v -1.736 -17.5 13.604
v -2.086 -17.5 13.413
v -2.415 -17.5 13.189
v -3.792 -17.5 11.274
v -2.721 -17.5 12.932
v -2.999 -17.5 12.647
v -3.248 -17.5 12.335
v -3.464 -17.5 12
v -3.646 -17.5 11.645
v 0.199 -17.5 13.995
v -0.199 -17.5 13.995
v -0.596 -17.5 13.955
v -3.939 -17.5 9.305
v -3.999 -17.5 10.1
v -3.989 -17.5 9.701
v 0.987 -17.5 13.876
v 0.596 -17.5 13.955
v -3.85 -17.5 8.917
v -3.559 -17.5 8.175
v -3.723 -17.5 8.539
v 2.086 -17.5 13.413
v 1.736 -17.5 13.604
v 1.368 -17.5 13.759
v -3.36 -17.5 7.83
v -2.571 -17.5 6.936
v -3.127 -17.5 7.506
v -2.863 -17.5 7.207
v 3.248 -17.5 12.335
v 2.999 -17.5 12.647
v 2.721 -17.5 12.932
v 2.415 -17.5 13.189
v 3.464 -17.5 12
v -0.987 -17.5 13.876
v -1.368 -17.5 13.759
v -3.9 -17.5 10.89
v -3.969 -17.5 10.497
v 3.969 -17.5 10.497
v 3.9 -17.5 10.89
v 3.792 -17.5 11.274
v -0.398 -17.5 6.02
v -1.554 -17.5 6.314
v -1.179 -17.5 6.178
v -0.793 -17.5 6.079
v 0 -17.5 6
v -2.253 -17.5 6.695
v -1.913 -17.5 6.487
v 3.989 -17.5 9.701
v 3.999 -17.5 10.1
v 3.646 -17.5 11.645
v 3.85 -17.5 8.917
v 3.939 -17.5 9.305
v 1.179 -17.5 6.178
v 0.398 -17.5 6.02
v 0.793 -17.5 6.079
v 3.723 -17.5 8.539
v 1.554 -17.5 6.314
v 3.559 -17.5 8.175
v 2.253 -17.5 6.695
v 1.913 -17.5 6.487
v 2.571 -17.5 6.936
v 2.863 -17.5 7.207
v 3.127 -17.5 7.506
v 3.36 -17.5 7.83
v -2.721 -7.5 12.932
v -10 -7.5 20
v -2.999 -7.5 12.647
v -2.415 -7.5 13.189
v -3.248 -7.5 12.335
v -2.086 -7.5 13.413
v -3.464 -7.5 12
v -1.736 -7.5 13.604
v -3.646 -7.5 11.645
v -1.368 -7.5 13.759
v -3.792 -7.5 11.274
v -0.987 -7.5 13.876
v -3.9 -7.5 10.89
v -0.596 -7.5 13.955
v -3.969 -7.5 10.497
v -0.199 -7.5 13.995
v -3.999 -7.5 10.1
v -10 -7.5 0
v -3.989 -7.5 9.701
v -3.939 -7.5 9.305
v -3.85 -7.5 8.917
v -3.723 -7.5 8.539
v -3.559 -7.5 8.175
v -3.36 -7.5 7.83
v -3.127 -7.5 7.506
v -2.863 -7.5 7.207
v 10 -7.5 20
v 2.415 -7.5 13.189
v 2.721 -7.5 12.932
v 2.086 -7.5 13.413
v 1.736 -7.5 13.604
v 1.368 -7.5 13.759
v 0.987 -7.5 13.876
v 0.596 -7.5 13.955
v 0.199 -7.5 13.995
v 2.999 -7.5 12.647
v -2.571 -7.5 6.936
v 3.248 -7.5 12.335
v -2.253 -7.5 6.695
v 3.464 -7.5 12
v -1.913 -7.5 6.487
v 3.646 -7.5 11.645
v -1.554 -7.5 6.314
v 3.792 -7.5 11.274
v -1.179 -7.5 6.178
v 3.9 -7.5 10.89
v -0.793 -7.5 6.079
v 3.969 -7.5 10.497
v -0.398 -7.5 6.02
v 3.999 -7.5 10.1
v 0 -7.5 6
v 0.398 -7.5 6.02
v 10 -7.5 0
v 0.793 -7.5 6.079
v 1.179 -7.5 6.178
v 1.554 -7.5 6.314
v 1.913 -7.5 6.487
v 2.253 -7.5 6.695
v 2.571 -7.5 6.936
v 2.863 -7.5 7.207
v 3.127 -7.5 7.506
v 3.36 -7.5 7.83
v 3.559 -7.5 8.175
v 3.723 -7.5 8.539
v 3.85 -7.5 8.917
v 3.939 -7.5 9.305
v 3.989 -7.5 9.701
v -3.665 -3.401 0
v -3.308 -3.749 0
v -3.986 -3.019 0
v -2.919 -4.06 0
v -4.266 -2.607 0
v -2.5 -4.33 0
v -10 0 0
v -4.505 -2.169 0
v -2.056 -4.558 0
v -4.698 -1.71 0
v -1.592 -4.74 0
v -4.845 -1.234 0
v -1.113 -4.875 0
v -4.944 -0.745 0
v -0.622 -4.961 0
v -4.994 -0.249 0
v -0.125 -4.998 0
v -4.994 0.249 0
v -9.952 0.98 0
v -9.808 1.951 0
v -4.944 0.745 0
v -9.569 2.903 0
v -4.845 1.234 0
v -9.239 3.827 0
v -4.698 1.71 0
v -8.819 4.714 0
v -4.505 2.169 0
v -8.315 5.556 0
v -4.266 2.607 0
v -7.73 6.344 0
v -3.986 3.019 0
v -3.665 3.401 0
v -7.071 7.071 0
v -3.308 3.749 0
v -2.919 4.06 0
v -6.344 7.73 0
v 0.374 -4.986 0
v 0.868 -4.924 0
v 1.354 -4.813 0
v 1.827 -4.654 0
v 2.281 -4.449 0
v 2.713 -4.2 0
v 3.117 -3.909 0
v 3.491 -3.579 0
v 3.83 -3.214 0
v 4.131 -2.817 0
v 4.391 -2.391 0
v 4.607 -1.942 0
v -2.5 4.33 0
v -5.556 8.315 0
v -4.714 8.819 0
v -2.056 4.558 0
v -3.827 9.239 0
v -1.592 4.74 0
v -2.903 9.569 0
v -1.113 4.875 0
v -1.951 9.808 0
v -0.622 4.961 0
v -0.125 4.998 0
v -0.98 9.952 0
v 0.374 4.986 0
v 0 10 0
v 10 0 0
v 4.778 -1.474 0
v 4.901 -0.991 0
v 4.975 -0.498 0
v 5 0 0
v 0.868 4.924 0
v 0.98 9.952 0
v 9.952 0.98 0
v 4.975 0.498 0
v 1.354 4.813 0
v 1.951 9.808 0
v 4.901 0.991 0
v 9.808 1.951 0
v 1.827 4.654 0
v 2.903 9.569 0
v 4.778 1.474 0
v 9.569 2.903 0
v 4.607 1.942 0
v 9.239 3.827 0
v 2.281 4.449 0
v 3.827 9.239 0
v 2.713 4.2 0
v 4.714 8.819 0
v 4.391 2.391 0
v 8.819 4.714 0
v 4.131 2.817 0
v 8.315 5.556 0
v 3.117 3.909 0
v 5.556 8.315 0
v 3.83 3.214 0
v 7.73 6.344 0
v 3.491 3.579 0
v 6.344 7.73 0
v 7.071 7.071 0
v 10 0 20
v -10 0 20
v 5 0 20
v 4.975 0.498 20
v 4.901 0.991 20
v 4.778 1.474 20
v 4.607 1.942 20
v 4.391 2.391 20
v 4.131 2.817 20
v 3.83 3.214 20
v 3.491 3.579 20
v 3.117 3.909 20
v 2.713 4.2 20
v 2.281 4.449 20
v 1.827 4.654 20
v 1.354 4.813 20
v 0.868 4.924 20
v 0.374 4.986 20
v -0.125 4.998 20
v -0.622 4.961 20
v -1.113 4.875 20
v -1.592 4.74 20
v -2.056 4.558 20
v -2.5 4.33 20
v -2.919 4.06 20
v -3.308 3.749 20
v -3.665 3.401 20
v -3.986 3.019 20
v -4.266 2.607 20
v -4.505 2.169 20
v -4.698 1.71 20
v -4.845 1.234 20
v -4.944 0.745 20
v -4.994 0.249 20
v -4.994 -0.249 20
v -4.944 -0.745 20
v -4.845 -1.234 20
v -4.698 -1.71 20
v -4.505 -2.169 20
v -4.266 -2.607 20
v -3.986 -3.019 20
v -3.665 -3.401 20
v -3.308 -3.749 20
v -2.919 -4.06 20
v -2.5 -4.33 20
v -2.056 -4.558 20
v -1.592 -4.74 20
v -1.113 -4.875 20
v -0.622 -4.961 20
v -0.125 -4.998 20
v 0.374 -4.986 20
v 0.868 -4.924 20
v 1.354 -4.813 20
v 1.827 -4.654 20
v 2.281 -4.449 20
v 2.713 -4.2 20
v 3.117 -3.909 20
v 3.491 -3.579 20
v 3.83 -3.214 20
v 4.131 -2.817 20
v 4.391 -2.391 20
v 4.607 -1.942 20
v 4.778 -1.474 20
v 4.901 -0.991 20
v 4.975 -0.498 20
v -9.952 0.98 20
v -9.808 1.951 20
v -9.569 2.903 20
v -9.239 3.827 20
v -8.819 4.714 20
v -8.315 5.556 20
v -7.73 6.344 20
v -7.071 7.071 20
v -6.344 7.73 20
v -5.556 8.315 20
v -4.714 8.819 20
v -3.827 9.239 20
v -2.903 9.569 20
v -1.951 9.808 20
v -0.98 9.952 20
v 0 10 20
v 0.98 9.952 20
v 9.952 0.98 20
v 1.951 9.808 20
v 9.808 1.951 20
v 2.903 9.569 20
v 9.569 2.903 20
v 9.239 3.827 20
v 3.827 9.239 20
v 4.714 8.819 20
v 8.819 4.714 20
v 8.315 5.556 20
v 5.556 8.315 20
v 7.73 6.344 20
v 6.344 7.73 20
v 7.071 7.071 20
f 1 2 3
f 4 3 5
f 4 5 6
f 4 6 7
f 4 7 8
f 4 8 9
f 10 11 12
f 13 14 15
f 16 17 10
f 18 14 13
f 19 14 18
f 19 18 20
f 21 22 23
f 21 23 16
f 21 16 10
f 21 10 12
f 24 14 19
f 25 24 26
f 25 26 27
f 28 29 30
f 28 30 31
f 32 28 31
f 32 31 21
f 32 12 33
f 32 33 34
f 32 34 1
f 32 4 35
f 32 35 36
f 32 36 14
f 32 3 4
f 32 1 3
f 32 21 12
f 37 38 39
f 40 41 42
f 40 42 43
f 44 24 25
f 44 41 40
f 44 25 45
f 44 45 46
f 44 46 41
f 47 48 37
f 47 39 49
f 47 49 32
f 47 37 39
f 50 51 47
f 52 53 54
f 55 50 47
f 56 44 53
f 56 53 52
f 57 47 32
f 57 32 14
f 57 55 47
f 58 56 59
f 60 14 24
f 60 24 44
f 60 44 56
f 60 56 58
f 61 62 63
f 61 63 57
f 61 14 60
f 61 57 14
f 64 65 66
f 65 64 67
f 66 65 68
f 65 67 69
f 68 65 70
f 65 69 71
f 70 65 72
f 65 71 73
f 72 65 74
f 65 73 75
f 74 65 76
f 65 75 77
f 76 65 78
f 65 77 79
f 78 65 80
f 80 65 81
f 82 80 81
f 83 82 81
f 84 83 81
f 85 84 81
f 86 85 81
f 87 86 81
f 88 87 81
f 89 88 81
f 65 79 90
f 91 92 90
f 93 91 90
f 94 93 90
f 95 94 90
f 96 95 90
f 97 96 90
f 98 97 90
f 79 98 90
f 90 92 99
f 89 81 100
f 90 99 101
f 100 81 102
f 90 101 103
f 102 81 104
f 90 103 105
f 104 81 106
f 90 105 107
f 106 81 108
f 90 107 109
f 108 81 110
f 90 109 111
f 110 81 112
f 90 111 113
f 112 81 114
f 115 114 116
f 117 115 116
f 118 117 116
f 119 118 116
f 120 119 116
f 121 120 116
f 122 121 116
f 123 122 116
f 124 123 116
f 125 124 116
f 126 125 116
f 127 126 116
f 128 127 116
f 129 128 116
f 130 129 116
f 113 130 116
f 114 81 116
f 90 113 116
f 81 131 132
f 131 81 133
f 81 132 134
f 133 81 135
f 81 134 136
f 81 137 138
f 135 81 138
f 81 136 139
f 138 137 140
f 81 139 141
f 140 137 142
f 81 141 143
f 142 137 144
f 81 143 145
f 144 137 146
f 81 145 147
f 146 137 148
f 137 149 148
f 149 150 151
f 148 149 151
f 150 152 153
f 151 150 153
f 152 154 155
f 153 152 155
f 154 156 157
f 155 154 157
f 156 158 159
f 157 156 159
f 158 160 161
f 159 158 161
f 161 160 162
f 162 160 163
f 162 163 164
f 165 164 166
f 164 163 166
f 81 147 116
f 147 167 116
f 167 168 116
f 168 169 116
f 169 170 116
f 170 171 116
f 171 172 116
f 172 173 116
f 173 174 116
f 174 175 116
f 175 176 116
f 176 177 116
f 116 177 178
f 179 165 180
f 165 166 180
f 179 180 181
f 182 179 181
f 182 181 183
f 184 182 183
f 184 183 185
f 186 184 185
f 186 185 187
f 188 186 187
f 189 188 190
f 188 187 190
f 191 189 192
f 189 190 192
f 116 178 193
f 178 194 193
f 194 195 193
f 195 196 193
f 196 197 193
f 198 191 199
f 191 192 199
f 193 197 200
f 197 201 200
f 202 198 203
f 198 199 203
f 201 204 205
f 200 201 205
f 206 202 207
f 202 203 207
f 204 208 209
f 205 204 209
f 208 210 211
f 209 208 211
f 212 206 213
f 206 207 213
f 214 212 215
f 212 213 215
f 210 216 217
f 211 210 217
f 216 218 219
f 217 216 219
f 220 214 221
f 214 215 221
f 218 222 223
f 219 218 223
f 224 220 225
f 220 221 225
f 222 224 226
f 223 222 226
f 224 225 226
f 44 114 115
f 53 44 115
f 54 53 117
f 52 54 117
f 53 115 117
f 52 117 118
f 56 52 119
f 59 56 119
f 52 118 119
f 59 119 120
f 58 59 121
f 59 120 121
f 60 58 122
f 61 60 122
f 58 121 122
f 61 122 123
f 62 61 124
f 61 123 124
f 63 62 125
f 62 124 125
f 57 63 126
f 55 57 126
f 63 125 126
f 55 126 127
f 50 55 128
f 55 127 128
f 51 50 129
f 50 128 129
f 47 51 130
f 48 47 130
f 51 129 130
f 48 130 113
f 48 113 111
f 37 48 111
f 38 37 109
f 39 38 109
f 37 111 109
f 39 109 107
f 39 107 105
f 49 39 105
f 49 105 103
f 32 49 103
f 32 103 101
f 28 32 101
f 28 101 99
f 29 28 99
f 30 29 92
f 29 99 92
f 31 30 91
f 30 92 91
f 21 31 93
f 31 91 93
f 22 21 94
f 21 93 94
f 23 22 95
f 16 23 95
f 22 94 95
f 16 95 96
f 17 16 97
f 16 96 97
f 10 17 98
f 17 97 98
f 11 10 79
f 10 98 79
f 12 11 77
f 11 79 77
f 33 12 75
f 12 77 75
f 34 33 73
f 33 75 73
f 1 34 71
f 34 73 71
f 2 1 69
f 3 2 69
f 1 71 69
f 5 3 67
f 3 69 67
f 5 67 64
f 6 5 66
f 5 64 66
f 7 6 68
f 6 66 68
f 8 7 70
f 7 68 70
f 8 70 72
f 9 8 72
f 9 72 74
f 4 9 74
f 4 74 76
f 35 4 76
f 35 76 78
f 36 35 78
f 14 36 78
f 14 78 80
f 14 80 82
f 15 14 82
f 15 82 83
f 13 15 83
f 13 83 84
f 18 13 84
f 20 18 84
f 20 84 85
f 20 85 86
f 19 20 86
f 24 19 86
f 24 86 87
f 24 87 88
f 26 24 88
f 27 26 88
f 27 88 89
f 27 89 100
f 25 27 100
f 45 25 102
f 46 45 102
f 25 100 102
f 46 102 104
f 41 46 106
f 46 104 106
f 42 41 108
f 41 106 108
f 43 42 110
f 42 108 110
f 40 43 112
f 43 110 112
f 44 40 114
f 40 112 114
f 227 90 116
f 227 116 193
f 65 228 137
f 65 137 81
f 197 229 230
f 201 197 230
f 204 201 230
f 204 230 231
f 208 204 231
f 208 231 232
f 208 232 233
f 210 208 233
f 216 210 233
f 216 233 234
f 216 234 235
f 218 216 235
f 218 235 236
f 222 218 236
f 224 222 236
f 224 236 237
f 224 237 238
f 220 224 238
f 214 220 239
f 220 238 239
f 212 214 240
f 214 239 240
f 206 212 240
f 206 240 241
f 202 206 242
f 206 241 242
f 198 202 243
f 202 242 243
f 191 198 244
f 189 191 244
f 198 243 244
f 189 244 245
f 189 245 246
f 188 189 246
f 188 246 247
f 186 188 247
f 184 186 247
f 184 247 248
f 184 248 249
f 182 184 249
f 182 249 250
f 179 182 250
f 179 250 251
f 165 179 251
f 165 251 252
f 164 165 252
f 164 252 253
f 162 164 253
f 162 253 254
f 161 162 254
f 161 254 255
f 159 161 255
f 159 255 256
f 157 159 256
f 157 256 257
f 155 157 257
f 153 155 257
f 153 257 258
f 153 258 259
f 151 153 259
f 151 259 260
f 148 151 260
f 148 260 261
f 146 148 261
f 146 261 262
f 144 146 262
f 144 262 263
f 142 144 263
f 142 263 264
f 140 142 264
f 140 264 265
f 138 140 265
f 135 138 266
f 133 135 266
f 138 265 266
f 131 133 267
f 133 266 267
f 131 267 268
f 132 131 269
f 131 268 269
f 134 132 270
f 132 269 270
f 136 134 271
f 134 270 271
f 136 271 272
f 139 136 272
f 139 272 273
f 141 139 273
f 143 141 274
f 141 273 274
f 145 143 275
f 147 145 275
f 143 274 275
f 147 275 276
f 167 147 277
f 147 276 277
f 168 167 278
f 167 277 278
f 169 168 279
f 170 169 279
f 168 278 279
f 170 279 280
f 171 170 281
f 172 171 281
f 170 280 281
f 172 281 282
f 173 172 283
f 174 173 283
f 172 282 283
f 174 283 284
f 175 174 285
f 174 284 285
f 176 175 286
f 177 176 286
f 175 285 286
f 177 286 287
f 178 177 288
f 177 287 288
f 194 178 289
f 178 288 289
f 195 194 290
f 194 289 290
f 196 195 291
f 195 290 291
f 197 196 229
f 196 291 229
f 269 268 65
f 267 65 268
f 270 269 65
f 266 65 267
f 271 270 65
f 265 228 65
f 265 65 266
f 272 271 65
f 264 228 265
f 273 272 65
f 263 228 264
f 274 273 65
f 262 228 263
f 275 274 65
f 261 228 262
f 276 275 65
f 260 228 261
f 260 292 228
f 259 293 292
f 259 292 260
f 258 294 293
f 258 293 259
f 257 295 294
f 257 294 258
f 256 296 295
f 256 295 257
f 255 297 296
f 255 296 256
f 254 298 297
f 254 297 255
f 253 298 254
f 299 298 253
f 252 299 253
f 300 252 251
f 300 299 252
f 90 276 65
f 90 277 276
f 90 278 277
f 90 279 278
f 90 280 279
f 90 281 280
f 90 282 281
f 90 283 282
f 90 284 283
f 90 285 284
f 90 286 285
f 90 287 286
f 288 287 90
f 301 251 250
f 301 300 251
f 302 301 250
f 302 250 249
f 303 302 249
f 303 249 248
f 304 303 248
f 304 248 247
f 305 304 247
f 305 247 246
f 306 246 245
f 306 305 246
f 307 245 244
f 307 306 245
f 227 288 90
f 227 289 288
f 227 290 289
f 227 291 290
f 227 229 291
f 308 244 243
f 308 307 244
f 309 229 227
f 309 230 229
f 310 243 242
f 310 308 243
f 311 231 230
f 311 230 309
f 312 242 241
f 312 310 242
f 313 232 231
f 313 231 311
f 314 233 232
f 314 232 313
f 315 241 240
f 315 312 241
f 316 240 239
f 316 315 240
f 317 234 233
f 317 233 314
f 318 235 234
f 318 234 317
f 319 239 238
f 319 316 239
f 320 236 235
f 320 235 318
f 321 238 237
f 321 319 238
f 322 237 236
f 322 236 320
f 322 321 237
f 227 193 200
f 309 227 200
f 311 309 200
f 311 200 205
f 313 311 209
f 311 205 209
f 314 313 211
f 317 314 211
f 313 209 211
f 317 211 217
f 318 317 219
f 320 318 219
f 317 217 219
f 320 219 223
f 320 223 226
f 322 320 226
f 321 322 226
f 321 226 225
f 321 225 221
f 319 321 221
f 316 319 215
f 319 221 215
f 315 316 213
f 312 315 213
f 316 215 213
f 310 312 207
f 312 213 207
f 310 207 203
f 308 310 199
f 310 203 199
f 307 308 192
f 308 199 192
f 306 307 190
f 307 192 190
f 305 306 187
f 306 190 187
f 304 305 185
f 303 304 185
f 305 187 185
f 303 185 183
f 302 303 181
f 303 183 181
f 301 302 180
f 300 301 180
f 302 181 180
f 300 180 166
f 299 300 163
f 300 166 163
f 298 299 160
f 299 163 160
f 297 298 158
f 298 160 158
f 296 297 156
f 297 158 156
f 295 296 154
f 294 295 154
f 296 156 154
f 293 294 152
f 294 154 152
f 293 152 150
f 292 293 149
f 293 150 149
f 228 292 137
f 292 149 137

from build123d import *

# Parameters (mm, degrees)
EXTRUDE_1_DEPTH     = 20
SKETCH_3_R          = 5
CUT_EXTRUDE_1_DEPTH = 25.494897428
SKETCH_5_R          = 4
EXTRUDE_2_DEPTH     = 10


with BuildPart() as part:
    # ｽｹｯﾁ2 → ﾎﾞｽ - 押し出し1 (new body)
    with BuildSketch(Plane.XY):
        with BuildLine():
            Line((-10, 0), (-10, -7.5))
            Line((-10, -7.5), (10, -7.5))
            Line((10, -7.5), (10, 0))
            ThreePointArc((10, 0), (0, 10), (-10, 0))
        make_face()
    extrude(amount=EXTRUDE_1_DEPTH)

    # ｽｹｯﾁ3 → ｶｯﾄ - 押し出し1 (cut, through all)
    with BuildSketch(Plane.XY.offset(20)):
        Circle(SKETCH_3_R)
    extrude(amount=-CUT_EXTRUDE_1_DEPTH, mode=Mode.SUBTRACT)

    # ｽｹｯﾁ5 → ﾎﾞｽ - 押し出し2 (add)
    with BuildSketch(Plane(origin=(0, -7.5, 0), x_dir=(-1, 0, 0), z_dir=(0, -1, 0))):
        with Locations(Location((0, -10, 0), (0, 0, 90))):
            Circle(SKETCH_5_R)
    extrude(amount=EXTRUDE_2_DEPTH)


solid = part.part
